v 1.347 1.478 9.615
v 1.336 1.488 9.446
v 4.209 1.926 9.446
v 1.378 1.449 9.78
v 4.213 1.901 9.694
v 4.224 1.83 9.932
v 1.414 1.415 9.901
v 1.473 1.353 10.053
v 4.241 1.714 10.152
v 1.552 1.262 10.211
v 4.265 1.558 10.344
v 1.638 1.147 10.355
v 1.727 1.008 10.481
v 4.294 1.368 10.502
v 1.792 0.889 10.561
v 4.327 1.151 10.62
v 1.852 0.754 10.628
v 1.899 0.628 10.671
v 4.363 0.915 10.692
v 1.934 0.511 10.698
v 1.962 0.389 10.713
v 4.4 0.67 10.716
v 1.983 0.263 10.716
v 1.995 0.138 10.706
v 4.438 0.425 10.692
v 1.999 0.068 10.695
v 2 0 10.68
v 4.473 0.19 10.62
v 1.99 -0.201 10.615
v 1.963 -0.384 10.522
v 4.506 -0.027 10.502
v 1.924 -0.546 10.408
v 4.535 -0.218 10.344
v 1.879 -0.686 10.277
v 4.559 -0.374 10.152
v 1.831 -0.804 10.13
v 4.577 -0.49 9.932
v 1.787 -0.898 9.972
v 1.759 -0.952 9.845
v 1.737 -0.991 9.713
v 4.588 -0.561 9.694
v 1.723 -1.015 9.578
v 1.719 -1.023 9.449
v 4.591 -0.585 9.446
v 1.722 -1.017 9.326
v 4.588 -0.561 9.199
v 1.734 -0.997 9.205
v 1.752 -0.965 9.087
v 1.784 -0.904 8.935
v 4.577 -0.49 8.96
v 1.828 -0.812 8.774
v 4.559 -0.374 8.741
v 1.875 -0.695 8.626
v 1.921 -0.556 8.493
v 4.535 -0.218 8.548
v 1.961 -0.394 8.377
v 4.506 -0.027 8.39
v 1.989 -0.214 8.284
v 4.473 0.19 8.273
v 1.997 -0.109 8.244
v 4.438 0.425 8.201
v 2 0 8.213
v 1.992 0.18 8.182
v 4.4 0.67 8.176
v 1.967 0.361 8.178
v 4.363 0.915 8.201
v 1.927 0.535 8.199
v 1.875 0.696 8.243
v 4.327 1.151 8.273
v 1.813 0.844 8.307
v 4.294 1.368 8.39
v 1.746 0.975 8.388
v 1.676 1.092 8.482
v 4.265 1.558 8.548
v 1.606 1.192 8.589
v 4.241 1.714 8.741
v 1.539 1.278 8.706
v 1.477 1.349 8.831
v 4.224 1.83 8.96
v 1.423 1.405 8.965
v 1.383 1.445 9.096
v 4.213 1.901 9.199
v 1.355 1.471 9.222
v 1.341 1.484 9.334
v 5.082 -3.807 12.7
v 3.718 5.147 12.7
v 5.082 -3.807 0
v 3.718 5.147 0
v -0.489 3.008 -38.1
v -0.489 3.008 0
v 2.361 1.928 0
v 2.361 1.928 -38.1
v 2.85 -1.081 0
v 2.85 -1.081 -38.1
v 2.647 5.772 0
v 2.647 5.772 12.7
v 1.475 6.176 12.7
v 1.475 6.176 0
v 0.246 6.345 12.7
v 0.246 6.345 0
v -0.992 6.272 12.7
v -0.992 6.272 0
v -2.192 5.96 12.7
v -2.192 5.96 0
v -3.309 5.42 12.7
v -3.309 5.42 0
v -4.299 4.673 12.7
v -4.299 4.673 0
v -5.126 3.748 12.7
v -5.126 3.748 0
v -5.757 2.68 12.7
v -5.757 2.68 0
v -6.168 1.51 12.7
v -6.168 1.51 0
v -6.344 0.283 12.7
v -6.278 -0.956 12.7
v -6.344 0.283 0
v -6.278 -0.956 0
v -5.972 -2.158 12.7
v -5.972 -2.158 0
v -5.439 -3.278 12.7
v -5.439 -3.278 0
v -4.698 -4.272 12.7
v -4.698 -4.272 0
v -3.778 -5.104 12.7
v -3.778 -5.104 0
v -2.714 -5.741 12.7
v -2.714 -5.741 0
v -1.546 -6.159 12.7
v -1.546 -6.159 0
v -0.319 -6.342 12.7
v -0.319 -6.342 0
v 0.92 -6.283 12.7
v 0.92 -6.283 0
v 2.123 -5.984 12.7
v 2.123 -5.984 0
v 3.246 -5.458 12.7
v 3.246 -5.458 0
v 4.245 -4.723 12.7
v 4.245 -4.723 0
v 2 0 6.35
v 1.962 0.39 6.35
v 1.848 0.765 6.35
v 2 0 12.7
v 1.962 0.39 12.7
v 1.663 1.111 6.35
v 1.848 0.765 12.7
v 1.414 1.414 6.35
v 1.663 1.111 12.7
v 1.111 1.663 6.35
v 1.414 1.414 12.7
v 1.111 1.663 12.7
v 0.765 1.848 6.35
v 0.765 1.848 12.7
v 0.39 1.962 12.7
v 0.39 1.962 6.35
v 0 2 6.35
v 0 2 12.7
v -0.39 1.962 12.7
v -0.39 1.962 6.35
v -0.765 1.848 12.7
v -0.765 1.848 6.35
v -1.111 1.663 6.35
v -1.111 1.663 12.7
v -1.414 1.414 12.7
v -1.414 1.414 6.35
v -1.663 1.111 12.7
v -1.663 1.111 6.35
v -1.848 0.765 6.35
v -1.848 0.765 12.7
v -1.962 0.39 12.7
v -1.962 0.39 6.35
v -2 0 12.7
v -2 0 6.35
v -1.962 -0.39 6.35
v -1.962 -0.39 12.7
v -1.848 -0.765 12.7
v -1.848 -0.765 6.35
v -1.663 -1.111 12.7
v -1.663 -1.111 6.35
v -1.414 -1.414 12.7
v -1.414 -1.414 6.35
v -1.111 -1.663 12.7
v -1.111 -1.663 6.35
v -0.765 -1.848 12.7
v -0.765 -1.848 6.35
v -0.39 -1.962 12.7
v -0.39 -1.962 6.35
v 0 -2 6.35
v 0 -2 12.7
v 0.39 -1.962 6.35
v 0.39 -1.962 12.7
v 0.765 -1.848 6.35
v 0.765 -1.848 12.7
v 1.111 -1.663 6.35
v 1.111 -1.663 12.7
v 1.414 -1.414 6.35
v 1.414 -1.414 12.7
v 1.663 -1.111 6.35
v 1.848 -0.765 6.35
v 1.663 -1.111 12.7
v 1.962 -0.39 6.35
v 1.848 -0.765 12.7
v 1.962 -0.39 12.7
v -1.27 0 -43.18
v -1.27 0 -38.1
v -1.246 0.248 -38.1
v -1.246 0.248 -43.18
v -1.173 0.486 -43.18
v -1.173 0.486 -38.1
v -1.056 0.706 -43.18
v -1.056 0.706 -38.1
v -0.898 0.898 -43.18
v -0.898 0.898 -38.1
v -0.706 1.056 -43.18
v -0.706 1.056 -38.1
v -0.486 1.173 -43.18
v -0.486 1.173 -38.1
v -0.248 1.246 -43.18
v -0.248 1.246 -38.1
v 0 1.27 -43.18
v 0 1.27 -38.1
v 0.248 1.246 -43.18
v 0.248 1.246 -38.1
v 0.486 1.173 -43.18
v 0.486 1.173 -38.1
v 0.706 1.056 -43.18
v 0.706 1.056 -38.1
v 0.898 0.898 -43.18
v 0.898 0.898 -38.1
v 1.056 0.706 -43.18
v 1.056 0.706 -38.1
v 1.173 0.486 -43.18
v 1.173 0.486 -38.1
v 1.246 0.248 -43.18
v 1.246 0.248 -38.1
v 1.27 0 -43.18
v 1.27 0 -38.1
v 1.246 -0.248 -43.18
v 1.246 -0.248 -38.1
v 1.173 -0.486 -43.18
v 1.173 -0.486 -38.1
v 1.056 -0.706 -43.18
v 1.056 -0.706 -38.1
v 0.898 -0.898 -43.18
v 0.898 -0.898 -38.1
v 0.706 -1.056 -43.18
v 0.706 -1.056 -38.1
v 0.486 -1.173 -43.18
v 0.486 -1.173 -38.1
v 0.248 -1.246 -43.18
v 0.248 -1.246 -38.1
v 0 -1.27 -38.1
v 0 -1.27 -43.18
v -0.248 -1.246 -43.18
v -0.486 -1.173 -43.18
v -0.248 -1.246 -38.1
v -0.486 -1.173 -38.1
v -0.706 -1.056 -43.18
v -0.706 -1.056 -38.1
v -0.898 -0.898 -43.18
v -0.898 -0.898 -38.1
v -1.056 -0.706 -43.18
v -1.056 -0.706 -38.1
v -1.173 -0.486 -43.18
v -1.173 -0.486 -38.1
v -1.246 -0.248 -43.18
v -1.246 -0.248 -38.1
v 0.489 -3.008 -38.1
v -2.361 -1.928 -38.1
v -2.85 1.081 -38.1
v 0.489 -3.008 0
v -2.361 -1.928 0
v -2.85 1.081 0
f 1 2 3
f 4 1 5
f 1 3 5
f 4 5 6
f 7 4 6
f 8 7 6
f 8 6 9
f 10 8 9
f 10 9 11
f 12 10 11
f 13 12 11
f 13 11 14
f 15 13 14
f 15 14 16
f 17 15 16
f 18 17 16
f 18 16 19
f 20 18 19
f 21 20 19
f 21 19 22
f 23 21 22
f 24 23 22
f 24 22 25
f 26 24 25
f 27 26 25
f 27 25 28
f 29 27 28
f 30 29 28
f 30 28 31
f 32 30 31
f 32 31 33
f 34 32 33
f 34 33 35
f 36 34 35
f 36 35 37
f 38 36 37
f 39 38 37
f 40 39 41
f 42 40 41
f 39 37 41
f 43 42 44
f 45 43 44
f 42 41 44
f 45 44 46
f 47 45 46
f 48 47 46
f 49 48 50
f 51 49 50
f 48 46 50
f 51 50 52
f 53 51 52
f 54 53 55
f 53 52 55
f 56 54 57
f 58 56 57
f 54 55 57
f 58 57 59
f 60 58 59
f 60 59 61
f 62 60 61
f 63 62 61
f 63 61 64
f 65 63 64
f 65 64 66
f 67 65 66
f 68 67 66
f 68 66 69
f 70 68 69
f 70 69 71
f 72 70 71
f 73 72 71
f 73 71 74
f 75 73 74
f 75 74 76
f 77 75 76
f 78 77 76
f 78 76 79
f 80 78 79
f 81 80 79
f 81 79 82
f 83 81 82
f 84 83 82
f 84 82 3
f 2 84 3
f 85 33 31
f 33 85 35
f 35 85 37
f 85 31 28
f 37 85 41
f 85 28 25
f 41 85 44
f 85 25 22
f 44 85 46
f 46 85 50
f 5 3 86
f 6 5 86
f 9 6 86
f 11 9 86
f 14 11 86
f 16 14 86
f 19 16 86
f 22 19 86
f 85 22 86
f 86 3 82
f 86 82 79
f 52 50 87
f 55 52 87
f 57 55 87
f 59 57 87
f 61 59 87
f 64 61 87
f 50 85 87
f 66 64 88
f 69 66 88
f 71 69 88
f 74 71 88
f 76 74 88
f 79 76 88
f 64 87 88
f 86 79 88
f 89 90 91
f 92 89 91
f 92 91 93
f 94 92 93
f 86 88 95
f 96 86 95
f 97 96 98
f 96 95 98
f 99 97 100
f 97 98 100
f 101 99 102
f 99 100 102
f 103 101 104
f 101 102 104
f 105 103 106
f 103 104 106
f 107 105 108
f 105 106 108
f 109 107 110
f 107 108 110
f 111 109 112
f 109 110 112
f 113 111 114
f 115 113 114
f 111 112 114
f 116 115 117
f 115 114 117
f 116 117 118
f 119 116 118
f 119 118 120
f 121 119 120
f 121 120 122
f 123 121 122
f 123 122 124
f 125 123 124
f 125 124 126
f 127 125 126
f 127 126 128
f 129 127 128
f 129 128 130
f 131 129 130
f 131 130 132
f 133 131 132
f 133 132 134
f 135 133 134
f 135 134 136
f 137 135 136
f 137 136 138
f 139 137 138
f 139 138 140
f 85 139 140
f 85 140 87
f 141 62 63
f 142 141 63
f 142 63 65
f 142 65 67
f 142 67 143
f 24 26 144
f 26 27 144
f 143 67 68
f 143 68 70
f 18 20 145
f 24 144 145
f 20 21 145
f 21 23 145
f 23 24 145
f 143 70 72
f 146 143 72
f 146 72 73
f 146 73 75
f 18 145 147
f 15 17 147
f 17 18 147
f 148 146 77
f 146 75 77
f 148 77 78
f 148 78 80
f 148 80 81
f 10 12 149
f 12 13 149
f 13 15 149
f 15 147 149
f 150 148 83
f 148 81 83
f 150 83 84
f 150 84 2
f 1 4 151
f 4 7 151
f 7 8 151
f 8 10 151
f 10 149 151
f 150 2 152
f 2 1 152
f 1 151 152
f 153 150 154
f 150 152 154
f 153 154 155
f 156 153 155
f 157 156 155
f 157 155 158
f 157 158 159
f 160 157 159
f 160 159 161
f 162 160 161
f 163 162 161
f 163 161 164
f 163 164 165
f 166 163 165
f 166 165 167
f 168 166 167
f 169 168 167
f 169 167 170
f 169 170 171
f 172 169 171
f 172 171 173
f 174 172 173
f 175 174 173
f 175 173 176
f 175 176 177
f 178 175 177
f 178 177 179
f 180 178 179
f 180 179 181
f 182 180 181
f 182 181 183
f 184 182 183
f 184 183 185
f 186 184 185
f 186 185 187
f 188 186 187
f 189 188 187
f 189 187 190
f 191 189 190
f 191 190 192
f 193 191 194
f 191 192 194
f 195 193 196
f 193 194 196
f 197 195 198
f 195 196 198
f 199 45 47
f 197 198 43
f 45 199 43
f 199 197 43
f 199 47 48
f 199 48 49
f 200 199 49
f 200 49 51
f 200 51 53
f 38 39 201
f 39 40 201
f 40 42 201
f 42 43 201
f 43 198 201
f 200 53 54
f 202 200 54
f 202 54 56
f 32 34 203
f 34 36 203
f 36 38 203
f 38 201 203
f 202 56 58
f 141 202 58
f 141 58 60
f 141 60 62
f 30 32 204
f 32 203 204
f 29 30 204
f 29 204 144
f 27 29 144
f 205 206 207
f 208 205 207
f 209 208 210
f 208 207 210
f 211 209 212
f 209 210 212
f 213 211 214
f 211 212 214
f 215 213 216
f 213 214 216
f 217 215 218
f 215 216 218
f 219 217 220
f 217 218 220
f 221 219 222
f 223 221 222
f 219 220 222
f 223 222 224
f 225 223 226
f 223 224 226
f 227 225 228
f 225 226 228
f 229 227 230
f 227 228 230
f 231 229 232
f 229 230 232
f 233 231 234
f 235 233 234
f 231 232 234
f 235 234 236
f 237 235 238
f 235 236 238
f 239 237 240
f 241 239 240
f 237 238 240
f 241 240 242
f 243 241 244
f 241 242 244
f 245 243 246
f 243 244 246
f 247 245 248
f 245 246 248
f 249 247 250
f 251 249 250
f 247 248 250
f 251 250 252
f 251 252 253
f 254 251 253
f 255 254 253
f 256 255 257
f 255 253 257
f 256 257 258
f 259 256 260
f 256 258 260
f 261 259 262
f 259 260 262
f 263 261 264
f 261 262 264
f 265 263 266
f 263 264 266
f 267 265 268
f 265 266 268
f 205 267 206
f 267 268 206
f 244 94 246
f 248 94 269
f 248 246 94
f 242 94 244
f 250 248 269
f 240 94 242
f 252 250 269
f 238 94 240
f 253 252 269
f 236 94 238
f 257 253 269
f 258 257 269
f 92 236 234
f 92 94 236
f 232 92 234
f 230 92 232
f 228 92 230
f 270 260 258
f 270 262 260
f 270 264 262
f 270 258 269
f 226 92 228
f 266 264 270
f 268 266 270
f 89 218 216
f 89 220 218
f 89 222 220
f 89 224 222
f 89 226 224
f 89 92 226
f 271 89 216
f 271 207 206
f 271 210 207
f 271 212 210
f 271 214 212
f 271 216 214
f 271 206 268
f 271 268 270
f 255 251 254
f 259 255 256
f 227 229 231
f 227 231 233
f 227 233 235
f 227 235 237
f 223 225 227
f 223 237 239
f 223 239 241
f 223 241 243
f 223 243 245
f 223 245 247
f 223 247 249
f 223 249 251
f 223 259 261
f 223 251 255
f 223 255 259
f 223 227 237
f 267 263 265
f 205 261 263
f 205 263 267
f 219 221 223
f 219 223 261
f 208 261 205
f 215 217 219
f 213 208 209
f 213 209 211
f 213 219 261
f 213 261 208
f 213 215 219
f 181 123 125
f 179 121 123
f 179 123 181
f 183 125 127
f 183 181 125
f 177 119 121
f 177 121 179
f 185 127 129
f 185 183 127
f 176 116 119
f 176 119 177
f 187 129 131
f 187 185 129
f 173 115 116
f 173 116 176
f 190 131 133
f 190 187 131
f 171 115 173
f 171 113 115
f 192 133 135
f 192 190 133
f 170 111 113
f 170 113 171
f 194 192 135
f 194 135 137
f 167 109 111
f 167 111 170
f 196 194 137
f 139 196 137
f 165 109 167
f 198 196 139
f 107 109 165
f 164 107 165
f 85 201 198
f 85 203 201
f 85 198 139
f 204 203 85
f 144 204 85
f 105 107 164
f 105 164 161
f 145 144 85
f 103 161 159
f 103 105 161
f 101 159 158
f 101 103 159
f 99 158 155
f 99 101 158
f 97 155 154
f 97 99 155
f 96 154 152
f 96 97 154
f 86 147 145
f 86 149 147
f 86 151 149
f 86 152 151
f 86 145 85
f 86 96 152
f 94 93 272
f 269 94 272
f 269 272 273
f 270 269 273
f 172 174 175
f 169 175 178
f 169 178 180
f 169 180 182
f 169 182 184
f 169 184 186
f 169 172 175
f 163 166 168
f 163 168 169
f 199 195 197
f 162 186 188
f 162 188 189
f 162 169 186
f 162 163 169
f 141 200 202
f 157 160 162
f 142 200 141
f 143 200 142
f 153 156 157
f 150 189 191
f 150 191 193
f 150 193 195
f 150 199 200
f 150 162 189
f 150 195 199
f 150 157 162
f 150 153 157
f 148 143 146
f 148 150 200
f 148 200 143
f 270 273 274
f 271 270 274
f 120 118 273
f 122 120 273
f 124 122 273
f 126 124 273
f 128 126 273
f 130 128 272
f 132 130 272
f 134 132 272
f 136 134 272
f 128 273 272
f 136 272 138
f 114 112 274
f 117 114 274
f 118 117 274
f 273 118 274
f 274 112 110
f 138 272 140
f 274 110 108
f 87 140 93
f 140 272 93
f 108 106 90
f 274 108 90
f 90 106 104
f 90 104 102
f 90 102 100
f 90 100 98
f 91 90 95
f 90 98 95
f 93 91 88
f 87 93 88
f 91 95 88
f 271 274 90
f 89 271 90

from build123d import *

# Parameters (mm, degrees)
SKETCH1_R           = 6.35
BOSS_EXTRUDE1_DEPTH = 12.7
BOSS_EXTRUDE2_DEPTH = 38.1
SKETCH8_R           = 1.27
BOSS_EXTRUDE3_DEPTH = 5.08
CUT_EXTRUDE1_DEPTH  = 13.97
SKETCH10_R          = 1.27
CUT_EXTRUDE2_DEPTH  = 5.08
SKETCH11_R          = 2
CUT_EXTRUDE3_DEPTH  = 6.35


with BuildPart() as part:
    # Sketch1 → Boss-Extrude1 (new body)
    with BuildSketch(Plane.XY):
        Circle(SKETCH1_R)
    extrude(amount=BOSS_EXTRUDE1_DEPTH)

    # Sketch3 → Boss-Extrude2 (add)
    with BuildSketch(Plane(origin=(0, 0, 0), x_dir=(-1, 0, 0), z_dir=(0, 0, -1))):
        Polygon((0.489155942, 3.00848222), (-2.360844058, 1.927862582), (-2.85, -1.080619638), (-0.489155942, -3.00848222), (2.360844058, -1.927862582), (2.85, 1.080619638), align=None)
    extrude(amount=BOSS_EXTRUDE2_DEPTH)

    # Sketch8 → Boss-Extrude3 (add)
    with BuildSketch(Plane(origin=(0, 0, -38.1), x_dir=(-1, 0, 0), z_dir=(0, 0, -1))):
        Circle(SKETCH8_R)
    extrude(amount=BOSS_EXTRUDE3_DEPTH)

    # Sketch9 → Cut-Extrude1 (cut)
    with BuildSketch(Plane(origin=(0, 0, 0), x_dir=(-1, 0, 0), z_dir=(0, 0, -1))):
        Polygon((-5.082038886, -3.807279968), (-3.718493538, 5.14735911), (-6.16534328, 5.519947057), (-7.528888629, -3.434692022), align=None)
    extrude(amount=-CUT_EXTRUDE1_DEPTH, mode=Mode.SUBTRACT)

    # Sketch10 → Cut-Extrude2 (cut)
    with BuildSketch(Plane(origin=(4.400266212, 0.670039571, 0), x_dir=(0, 0, -1), z_dir=(0.988604335884072, 0.1505372614046529, 0))):
        with Locations(Location((-9.446434999, 0, 0), (0, 0, 90))):
            Circle(SKETCH10_R)
    extrude(amount=-CUT_EXTRUDE2_DEPTH, mode=Mode.SUBTRACT)

    # Sketch11 → Cut-Extrude3 (cut)
    with BuildSketch(Plane.XY.offset(12.7)):
        Circle(SKETCH11_R)
    extrude(amount=-CUT_EXTRUDE3_DEPTH, mode=Mode.SUBTRACT)


solid = part.part
